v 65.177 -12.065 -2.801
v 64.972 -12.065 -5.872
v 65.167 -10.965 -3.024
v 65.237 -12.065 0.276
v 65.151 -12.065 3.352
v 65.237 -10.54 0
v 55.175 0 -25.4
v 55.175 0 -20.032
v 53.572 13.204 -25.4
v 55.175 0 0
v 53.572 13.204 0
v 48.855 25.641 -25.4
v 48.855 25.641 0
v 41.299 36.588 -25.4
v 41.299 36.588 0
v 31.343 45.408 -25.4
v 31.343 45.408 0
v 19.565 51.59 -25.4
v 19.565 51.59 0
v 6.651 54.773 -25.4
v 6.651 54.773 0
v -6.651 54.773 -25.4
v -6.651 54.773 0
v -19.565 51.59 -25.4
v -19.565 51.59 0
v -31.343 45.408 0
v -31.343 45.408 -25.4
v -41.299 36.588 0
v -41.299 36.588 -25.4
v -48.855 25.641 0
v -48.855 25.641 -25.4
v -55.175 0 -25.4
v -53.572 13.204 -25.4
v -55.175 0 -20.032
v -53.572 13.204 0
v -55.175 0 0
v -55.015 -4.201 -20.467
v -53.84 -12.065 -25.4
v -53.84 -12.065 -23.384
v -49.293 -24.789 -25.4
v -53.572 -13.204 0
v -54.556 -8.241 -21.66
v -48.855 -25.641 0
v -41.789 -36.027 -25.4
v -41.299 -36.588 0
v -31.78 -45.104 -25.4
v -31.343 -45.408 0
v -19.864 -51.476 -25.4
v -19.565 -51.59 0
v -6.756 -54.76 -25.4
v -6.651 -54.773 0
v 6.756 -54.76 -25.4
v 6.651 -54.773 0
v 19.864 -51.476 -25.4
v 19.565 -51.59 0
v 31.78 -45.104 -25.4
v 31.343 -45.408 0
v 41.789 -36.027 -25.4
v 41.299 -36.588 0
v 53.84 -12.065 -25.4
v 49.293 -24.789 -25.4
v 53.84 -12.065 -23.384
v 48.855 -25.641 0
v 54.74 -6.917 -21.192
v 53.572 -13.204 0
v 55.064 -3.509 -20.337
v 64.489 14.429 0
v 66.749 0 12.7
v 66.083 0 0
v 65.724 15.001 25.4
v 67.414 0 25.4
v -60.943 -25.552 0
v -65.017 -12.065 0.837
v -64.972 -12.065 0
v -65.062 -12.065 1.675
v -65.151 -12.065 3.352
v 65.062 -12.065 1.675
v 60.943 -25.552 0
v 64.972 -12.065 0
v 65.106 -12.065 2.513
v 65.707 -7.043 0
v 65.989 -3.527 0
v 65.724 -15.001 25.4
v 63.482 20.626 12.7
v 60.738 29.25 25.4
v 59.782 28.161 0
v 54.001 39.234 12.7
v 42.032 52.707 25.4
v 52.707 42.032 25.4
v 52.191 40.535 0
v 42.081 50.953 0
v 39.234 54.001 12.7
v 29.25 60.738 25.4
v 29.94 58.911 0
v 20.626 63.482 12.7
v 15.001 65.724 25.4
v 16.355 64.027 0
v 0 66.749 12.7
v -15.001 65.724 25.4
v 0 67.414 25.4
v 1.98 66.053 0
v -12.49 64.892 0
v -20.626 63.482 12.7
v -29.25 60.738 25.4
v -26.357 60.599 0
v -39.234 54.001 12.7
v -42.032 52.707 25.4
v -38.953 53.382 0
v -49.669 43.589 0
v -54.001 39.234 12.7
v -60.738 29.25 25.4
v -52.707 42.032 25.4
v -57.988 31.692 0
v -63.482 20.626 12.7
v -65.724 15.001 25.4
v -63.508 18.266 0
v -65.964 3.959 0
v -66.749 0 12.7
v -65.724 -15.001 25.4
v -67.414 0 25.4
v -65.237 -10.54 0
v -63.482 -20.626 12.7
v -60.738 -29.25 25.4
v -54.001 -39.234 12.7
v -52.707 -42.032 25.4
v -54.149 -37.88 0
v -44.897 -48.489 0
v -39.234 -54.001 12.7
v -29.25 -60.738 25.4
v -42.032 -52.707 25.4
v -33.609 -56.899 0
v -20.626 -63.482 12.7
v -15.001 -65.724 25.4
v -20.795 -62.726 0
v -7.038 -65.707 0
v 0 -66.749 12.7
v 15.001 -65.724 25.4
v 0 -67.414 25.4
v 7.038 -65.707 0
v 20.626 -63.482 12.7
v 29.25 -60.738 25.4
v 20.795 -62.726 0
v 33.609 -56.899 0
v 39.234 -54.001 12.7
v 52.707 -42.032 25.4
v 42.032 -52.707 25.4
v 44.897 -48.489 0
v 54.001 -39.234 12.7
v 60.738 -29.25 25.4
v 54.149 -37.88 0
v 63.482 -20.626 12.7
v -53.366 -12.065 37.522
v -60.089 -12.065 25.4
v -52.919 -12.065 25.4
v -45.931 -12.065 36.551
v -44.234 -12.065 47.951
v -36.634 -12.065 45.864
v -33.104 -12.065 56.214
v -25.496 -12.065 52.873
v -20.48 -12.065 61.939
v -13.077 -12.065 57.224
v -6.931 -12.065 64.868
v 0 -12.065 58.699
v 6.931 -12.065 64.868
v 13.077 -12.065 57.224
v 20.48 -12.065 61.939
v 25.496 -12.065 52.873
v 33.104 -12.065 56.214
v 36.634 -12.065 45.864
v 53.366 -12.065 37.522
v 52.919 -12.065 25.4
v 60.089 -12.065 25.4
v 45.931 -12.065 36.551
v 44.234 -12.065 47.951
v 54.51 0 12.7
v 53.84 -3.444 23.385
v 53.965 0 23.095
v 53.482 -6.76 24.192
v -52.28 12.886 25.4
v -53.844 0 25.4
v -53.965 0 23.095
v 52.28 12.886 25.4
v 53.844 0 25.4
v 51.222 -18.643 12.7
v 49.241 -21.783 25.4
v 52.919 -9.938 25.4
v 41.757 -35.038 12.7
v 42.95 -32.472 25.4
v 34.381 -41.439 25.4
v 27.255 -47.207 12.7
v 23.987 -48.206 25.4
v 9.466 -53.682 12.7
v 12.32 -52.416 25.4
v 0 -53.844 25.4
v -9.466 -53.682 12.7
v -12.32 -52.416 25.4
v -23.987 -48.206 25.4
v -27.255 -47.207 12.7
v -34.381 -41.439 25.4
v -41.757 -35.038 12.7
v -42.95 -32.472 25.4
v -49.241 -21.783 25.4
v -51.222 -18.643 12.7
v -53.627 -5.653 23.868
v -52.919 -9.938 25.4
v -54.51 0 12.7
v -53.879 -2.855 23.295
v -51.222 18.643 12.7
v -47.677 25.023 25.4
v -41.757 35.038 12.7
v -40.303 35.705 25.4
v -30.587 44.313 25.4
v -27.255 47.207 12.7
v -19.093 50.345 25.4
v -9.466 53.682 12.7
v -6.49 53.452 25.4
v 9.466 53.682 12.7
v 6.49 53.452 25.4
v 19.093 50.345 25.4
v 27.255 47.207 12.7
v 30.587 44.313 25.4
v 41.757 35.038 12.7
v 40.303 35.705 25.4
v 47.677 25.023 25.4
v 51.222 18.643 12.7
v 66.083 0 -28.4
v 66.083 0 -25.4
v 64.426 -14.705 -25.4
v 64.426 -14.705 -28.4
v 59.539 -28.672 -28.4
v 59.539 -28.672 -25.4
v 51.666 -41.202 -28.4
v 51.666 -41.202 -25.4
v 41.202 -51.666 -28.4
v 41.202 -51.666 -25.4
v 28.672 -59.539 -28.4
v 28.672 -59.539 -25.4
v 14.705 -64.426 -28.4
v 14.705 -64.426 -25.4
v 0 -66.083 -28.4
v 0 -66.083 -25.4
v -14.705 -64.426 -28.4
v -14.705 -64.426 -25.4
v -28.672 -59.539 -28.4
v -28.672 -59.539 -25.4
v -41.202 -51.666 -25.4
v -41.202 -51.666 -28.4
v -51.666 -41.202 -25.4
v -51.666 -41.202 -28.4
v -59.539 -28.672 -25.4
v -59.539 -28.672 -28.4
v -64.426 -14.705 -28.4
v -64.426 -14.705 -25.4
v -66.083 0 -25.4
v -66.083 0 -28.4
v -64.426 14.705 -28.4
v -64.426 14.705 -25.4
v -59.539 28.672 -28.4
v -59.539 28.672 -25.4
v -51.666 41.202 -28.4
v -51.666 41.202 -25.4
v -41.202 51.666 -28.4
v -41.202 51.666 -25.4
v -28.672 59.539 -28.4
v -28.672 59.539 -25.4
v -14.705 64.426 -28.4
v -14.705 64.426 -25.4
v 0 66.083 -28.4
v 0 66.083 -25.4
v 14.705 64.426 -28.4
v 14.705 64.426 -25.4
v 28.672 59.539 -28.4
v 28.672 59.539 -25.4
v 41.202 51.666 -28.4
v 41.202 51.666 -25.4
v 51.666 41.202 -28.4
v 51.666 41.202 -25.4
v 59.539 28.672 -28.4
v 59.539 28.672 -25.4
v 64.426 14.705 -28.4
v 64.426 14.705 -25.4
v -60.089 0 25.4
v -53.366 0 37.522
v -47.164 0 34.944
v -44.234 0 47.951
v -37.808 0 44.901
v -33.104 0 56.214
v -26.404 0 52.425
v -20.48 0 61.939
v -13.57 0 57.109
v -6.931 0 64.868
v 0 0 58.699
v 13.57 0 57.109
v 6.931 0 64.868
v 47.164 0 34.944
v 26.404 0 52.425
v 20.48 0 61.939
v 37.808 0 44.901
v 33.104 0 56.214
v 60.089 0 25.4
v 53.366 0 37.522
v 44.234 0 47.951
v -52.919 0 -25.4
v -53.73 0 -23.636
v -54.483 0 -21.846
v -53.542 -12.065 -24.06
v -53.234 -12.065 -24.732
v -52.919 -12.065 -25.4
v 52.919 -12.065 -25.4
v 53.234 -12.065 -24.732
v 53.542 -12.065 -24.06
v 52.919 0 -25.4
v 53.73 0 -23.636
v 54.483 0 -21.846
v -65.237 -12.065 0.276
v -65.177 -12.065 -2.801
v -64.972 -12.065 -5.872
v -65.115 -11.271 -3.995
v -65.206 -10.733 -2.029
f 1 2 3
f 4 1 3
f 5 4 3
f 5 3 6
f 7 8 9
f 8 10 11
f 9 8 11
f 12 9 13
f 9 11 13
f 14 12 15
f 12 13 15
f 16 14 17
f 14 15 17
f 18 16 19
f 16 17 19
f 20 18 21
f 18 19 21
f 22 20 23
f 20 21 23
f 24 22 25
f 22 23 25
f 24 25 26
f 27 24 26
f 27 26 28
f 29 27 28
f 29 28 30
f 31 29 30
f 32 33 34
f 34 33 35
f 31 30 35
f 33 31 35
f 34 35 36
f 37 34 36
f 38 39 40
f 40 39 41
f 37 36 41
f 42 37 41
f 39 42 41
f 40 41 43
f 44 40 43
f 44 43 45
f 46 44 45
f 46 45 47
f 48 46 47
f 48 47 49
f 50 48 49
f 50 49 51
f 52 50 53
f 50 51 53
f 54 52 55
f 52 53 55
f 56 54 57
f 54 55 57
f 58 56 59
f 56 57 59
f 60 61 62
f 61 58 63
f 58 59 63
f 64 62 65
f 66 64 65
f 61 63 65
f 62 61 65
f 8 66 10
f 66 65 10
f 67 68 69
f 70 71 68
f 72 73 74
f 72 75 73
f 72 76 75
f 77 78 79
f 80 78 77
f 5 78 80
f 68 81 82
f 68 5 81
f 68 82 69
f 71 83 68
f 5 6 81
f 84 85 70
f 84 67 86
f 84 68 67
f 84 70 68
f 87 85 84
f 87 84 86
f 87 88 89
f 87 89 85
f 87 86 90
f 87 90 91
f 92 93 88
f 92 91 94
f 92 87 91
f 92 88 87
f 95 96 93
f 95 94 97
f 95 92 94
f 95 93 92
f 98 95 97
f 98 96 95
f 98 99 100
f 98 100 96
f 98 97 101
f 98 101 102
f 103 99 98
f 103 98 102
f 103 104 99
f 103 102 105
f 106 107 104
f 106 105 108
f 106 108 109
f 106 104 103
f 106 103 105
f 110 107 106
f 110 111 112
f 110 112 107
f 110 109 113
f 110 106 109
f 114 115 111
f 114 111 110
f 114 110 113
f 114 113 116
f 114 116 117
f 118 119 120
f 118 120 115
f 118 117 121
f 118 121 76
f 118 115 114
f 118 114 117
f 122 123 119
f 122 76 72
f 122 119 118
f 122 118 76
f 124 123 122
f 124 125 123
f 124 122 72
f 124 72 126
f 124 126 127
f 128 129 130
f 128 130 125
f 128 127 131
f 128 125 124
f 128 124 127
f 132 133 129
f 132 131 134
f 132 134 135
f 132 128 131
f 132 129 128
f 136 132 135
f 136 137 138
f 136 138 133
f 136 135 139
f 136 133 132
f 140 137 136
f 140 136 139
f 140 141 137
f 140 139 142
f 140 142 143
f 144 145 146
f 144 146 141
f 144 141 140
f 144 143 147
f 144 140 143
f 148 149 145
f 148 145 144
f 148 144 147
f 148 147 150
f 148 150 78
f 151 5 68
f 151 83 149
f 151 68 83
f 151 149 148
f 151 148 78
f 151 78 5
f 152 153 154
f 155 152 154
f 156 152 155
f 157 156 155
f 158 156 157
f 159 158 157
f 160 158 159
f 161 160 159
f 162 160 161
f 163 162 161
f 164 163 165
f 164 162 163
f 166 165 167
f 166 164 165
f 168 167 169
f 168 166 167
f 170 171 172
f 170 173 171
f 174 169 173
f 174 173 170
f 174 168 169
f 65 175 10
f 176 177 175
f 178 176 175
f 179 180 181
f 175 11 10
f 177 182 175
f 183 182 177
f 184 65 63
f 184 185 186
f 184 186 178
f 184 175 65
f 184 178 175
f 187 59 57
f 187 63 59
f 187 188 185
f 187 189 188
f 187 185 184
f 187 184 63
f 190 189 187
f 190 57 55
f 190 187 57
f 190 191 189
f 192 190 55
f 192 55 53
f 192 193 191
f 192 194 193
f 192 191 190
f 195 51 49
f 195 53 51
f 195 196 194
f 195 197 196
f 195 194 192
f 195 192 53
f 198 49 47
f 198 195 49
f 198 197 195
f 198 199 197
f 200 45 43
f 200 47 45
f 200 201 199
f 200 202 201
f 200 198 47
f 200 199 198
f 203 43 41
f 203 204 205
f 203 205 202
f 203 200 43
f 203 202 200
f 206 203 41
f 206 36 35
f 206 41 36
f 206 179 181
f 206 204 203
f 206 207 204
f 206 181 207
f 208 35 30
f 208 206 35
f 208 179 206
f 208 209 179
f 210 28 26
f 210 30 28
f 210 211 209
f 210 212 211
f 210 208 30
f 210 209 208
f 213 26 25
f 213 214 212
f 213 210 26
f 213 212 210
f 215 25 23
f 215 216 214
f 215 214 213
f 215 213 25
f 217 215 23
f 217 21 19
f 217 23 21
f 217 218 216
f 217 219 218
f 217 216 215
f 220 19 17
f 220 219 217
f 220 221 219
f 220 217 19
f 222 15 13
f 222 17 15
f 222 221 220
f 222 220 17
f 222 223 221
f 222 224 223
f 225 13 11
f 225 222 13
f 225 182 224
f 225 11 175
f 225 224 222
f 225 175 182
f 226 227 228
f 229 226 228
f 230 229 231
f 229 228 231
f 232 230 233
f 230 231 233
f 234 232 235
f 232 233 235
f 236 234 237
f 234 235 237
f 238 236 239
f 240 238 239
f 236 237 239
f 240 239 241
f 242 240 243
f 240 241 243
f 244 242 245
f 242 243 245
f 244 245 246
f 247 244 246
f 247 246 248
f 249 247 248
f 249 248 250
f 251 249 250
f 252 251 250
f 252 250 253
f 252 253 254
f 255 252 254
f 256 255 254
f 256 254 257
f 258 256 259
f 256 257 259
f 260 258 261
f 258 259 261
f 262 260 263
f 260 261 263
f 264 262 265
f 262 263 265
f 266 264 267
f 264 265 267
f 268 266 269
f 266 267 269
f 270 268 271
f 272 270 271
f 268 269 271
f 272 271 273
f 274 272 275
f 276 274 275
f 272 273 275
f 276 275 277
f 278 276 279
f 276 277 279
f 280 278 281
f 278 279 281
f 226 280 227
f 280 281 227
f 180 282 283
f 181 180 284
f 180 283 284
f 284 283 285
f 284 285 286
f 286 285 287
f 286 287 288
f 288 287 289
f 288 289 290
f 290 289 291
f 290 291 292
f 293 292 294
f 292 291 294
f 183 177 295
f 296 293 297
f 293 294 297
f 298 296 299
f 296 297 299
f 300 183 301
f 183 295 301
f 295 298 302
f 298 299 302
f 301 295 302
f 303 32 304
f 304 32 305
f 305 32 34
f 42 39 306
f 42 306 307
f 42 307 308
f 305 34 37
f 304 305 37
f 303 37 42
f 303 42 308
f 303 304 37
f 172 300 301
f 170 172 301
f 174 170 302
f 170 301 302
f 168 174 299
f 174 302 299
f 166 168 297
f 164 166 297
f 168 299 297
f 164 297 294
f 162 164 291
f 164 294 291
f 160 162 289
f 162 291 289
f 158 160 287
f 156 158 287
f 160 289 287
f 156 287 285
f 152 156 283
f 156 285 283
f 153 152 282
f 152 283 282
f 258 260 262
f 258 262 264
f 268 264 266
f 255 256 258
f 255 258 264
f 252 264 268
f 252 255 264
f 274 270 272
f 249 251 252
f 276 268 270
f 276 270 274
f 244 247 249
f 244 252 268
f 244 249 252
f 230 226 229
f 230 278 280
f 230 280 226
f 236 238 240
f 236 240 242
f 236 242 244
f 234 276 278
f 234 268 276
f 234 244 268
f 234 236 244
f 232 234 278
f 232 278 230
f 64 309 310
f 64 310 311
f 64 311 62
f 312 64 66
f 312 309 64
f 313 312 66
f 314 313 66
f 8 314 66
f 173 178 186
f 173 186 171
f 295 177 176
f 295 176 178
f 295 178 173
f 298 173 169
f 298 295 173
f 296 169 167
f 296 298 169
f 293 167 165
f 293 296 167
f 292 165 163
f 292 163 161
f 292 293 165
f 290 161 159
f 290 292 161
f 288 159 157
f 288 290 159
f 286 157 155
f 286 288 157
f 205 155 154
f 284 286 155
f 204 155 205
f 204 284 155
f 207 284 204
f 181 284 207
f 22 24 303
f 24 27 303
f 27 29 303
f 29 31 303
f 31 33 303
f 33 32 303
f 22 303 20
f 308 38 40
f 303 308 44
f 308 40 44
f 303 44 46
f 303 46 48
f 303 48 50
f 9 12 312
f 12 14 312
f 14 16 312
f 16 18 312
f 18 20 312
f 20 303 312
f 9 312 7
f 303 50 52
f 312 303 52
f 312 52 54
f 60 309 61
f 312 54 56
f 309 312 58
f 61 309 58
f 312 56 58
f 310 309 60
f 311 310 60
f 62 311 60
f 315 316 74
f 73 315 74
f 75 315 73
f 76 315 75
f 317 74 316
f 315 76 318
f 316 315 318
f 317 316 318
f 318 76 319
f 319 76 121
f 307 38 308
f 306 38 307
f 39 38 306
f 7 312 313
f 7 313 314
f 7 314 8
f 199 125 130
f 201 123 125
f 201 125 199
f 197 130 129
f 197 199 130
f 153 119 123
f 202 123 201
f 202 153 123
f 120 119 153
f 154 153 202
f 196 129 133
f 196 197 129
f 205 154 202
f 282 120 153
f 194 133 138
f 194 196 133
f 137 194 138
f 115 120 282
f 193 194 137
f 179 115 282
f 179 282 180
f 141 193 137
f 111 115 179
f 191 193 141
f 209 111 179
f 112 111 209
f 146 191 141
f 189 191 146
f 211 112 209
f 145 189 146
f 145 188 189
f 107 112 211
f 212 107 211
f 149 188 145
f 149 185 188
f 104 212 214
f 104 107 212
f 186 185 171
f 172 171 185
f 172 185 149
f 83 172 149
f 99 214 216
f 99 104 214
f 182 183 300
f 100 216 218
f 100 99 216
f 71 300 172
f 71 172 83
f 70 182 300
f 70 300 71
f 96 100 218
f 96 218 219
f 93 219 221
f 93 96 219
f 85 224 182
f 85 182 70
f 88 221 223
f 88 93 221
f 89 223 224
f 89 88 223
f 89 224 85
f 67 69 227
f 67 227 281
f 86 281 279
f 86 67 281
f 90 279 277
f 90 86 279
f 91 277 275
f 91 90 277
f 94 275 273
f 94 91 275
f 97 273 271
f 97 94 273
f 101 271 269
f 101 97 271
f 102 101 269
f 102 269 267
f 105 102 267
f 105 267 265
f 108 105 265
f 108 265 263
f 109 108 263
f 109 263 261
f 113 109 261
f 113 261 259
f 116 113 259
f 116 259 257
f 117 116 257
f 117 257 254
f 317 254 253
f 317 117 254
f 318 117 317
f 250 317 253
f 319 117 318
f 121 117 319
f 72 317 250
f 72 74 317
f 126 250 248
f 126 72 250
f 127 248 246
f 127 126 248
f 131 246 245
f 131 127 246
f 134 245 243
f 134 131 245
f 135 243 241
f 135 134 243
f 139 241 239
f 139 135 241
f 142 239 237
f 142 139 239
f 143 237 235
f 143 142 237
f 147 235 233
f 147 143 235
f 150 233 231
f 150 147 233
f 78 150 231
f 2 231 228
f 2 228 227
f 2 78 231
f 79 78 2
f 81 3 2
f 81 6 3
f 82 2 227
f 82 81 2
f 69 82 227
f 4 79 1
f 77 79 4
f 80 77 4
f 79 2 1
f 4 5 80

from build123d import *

# Parameters (mm, degrees)
F0_R          = 65.2372499689
F0_R_2        = 58.6990889692
F1_DEPTH      = 12.065
F2_R          = 66.0831305436
F2_R_2        = 55.1753254818
F3_DEPTH      = 25.4
F3_TAPER      = -3
F3_DEPTH_BACK = 25.4
F5_DEPTH      = 50.25
F6_R          = 66.0831305436
F7_DEPTH      = 3


with BuildPart() as f1:
    # F0 (on Front) → F1 (new body)
    with BuildSketch(Plane.XZ):
        Circle(F0_R)
        Circle(F0_R_2, mode=Mode.SUBTRACT)
    extrude(amount=F1_DEPTH)

    # F2 (on Top) → F3 (join, two sides)
    with BuildSketch(Plane.XY) as f3_sk:
        Circle(F2_R)
        Circle(F2_R_2, mode=Mode.SUBTRACT)
    extrude(amount=F3_DEPTH, taper=F3_TAPER)
    extrude(f3_sk.sketch, amount=-F3_DEPTH_BACK)

    # F4 (on Front) → F5 (cut)
    with BuildSketch(Plane.XZ):
        Polygon((66.0831305436, -25.4), (-66.0831305436, -25.4), (-61.7706626654, -79.2663544416), (70.8459764719, -79.2663544416), align=None)
    extrude(amount=F5_DEPTH, mode=Mode.SUBTRACT)

    # F6 (on face) → F7 (join)
    with BuildSketch(Plane(origin=(0, 0, -25.4), x_dir=(1, 0, 0), z_dir=(0, 0, -1))):
        Circle(F6_R)
    extrude(amount=F7_DEPTH)


solid = f1.part
